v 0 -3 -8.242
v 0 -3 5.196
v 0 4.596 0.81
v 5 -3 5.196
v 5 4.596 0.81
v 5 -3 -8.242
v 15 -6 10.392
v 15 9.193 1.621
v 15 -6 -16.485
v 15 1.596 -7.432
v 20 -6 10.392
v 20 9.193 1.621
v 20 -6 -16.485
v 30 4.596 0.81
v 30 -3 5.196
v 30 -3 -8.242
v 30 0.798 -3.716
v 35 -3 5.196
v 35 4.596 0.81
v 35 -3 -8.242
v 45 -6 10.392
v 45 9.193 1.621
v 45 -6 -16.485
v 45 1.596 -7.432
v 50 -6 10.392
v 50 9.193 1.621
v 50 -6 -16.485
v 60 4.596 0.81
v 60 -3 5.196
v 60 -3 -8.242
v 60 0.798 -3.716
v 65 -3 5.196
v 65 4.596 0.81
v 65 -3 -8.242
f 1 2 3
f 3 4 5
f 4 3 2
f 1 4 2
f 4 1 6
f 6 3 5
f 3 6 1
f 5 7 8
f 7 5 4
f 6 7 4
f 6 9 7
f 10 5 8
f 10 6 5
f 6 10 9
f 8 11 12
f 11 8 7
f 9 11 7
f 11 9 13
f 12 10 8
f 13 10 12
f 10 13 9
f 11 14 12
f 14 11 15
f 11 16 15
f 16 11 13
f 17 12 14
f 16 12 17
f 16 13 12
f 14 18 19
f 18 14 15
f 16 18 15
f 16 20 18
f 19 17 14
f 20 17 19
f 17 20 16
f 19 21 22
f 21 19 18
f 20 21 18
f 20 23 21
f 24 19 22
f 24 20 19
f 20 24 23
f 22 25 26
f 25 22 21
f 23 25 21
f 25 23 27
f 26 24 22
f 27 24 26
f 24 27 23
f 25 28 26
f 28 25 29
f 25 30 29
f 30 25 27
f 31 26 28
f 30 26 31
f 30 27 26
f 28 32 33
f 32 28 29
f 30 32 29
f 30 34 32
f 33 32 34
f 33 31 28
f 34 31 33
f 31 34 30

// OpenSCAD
//-*- C -*-
//http://www.mathalino.com/reviewer/derivation-of-formulas/derivation-of-formula-for-radius-of-incircle
// nPnts = number of points (minimum 3)
// outer = radius to outer points
// inR = radius to inner circle
//           ..
//          /  \.
//         /  2   \.
//        /   |      \.
//       / 1'  .  3'     \.
//      /   ./   -\ .       \.
//     / 3 /   2'      \.   1   \
//    ---------------------------
//
module triAng(cornAng1, cornAng2, inR) {
	gama3=180-cornAng1-cornAng2;
	// polar to cartesian: radius/angle to x/y
	function x(r, a) = r * cos(a);
	function y(r, a) = r * sin(a);
	tpi1=-cornAng1/2;
	x1 = x(inR/sin(cornAng1/2), tpi1);
	y1 = y(inR/sin(cornAng1/2), tpi1);
	tpi2 = tpi1 + 180-cornAng1/2-cornAng2/2;
	x2 = x(inR/sin(cornAng2/2), tpi2);
	y2 = y(inR/sin(cornAng2/2), tpi2);
	tpi3 = tpi2 + 180-cornAng2/2-gama3/2;
	x3 = x(inR/sin(gama3/2), tpi3);
	y3 = y(inR/sin(gama3/2), tpi3);

	polygon(points = [[x1, y1], [x2, y2], [x3, y3]], paths = [[0, 1, 2]]);
}

module linxtrude(xx, hheight, sscale) {
	translate([xx,0,0]) rotate([0,90,0])
		linear_extrude(height = hheight, center=false, convexity=10,
		               twist=0, slices=1, scale = sscale)
			children();
}

cornAng1 = 40;
cornAng2 = 80;
contractRatio = 2;
contractRatioB = 2;
Rpore = 6;
Rtrot = Rpore/contractRatio;
RtrotB = Rpore/contractRatioB;

linxtrude( 0,  5.000000000001, 1.)           triAng(cornAng1, cornAng2, RtrotB);
linxtrude( 5, 10.000000000001, Rpore/RtrotB) triAng(cornAng1, cornAng2, RtrotB);
linxtrude(15,  5.000000000001, 1)            triAng(cornAng1, cornAng2, Rpore);
linxtrude(20, 10.000000000001, Rtrot/Rpore)  triAng(cornAng1, cornAng2, Rpore);
linxtrude(30,  5.000000000001, 1)            triAng(cornAng1, cornAng2, Rtrot);
linxtrude(35, 10.000000000001, Rpore/Rtrot)  triAng(cornAng1, cornAng2, Rtrot);
linxtrude(45,  5.000000000001, 1)            triAng(cornAng1, cornAng2, Rpore);
linxtrude(50, 10.000000000001, RtrotB/Rpore) triAng(cornAng1, cornAng2, Rpore);
linxtrude(60,  5.000000000000, 1)            triAng(cornAng1, cornAng2, RtrotB);
